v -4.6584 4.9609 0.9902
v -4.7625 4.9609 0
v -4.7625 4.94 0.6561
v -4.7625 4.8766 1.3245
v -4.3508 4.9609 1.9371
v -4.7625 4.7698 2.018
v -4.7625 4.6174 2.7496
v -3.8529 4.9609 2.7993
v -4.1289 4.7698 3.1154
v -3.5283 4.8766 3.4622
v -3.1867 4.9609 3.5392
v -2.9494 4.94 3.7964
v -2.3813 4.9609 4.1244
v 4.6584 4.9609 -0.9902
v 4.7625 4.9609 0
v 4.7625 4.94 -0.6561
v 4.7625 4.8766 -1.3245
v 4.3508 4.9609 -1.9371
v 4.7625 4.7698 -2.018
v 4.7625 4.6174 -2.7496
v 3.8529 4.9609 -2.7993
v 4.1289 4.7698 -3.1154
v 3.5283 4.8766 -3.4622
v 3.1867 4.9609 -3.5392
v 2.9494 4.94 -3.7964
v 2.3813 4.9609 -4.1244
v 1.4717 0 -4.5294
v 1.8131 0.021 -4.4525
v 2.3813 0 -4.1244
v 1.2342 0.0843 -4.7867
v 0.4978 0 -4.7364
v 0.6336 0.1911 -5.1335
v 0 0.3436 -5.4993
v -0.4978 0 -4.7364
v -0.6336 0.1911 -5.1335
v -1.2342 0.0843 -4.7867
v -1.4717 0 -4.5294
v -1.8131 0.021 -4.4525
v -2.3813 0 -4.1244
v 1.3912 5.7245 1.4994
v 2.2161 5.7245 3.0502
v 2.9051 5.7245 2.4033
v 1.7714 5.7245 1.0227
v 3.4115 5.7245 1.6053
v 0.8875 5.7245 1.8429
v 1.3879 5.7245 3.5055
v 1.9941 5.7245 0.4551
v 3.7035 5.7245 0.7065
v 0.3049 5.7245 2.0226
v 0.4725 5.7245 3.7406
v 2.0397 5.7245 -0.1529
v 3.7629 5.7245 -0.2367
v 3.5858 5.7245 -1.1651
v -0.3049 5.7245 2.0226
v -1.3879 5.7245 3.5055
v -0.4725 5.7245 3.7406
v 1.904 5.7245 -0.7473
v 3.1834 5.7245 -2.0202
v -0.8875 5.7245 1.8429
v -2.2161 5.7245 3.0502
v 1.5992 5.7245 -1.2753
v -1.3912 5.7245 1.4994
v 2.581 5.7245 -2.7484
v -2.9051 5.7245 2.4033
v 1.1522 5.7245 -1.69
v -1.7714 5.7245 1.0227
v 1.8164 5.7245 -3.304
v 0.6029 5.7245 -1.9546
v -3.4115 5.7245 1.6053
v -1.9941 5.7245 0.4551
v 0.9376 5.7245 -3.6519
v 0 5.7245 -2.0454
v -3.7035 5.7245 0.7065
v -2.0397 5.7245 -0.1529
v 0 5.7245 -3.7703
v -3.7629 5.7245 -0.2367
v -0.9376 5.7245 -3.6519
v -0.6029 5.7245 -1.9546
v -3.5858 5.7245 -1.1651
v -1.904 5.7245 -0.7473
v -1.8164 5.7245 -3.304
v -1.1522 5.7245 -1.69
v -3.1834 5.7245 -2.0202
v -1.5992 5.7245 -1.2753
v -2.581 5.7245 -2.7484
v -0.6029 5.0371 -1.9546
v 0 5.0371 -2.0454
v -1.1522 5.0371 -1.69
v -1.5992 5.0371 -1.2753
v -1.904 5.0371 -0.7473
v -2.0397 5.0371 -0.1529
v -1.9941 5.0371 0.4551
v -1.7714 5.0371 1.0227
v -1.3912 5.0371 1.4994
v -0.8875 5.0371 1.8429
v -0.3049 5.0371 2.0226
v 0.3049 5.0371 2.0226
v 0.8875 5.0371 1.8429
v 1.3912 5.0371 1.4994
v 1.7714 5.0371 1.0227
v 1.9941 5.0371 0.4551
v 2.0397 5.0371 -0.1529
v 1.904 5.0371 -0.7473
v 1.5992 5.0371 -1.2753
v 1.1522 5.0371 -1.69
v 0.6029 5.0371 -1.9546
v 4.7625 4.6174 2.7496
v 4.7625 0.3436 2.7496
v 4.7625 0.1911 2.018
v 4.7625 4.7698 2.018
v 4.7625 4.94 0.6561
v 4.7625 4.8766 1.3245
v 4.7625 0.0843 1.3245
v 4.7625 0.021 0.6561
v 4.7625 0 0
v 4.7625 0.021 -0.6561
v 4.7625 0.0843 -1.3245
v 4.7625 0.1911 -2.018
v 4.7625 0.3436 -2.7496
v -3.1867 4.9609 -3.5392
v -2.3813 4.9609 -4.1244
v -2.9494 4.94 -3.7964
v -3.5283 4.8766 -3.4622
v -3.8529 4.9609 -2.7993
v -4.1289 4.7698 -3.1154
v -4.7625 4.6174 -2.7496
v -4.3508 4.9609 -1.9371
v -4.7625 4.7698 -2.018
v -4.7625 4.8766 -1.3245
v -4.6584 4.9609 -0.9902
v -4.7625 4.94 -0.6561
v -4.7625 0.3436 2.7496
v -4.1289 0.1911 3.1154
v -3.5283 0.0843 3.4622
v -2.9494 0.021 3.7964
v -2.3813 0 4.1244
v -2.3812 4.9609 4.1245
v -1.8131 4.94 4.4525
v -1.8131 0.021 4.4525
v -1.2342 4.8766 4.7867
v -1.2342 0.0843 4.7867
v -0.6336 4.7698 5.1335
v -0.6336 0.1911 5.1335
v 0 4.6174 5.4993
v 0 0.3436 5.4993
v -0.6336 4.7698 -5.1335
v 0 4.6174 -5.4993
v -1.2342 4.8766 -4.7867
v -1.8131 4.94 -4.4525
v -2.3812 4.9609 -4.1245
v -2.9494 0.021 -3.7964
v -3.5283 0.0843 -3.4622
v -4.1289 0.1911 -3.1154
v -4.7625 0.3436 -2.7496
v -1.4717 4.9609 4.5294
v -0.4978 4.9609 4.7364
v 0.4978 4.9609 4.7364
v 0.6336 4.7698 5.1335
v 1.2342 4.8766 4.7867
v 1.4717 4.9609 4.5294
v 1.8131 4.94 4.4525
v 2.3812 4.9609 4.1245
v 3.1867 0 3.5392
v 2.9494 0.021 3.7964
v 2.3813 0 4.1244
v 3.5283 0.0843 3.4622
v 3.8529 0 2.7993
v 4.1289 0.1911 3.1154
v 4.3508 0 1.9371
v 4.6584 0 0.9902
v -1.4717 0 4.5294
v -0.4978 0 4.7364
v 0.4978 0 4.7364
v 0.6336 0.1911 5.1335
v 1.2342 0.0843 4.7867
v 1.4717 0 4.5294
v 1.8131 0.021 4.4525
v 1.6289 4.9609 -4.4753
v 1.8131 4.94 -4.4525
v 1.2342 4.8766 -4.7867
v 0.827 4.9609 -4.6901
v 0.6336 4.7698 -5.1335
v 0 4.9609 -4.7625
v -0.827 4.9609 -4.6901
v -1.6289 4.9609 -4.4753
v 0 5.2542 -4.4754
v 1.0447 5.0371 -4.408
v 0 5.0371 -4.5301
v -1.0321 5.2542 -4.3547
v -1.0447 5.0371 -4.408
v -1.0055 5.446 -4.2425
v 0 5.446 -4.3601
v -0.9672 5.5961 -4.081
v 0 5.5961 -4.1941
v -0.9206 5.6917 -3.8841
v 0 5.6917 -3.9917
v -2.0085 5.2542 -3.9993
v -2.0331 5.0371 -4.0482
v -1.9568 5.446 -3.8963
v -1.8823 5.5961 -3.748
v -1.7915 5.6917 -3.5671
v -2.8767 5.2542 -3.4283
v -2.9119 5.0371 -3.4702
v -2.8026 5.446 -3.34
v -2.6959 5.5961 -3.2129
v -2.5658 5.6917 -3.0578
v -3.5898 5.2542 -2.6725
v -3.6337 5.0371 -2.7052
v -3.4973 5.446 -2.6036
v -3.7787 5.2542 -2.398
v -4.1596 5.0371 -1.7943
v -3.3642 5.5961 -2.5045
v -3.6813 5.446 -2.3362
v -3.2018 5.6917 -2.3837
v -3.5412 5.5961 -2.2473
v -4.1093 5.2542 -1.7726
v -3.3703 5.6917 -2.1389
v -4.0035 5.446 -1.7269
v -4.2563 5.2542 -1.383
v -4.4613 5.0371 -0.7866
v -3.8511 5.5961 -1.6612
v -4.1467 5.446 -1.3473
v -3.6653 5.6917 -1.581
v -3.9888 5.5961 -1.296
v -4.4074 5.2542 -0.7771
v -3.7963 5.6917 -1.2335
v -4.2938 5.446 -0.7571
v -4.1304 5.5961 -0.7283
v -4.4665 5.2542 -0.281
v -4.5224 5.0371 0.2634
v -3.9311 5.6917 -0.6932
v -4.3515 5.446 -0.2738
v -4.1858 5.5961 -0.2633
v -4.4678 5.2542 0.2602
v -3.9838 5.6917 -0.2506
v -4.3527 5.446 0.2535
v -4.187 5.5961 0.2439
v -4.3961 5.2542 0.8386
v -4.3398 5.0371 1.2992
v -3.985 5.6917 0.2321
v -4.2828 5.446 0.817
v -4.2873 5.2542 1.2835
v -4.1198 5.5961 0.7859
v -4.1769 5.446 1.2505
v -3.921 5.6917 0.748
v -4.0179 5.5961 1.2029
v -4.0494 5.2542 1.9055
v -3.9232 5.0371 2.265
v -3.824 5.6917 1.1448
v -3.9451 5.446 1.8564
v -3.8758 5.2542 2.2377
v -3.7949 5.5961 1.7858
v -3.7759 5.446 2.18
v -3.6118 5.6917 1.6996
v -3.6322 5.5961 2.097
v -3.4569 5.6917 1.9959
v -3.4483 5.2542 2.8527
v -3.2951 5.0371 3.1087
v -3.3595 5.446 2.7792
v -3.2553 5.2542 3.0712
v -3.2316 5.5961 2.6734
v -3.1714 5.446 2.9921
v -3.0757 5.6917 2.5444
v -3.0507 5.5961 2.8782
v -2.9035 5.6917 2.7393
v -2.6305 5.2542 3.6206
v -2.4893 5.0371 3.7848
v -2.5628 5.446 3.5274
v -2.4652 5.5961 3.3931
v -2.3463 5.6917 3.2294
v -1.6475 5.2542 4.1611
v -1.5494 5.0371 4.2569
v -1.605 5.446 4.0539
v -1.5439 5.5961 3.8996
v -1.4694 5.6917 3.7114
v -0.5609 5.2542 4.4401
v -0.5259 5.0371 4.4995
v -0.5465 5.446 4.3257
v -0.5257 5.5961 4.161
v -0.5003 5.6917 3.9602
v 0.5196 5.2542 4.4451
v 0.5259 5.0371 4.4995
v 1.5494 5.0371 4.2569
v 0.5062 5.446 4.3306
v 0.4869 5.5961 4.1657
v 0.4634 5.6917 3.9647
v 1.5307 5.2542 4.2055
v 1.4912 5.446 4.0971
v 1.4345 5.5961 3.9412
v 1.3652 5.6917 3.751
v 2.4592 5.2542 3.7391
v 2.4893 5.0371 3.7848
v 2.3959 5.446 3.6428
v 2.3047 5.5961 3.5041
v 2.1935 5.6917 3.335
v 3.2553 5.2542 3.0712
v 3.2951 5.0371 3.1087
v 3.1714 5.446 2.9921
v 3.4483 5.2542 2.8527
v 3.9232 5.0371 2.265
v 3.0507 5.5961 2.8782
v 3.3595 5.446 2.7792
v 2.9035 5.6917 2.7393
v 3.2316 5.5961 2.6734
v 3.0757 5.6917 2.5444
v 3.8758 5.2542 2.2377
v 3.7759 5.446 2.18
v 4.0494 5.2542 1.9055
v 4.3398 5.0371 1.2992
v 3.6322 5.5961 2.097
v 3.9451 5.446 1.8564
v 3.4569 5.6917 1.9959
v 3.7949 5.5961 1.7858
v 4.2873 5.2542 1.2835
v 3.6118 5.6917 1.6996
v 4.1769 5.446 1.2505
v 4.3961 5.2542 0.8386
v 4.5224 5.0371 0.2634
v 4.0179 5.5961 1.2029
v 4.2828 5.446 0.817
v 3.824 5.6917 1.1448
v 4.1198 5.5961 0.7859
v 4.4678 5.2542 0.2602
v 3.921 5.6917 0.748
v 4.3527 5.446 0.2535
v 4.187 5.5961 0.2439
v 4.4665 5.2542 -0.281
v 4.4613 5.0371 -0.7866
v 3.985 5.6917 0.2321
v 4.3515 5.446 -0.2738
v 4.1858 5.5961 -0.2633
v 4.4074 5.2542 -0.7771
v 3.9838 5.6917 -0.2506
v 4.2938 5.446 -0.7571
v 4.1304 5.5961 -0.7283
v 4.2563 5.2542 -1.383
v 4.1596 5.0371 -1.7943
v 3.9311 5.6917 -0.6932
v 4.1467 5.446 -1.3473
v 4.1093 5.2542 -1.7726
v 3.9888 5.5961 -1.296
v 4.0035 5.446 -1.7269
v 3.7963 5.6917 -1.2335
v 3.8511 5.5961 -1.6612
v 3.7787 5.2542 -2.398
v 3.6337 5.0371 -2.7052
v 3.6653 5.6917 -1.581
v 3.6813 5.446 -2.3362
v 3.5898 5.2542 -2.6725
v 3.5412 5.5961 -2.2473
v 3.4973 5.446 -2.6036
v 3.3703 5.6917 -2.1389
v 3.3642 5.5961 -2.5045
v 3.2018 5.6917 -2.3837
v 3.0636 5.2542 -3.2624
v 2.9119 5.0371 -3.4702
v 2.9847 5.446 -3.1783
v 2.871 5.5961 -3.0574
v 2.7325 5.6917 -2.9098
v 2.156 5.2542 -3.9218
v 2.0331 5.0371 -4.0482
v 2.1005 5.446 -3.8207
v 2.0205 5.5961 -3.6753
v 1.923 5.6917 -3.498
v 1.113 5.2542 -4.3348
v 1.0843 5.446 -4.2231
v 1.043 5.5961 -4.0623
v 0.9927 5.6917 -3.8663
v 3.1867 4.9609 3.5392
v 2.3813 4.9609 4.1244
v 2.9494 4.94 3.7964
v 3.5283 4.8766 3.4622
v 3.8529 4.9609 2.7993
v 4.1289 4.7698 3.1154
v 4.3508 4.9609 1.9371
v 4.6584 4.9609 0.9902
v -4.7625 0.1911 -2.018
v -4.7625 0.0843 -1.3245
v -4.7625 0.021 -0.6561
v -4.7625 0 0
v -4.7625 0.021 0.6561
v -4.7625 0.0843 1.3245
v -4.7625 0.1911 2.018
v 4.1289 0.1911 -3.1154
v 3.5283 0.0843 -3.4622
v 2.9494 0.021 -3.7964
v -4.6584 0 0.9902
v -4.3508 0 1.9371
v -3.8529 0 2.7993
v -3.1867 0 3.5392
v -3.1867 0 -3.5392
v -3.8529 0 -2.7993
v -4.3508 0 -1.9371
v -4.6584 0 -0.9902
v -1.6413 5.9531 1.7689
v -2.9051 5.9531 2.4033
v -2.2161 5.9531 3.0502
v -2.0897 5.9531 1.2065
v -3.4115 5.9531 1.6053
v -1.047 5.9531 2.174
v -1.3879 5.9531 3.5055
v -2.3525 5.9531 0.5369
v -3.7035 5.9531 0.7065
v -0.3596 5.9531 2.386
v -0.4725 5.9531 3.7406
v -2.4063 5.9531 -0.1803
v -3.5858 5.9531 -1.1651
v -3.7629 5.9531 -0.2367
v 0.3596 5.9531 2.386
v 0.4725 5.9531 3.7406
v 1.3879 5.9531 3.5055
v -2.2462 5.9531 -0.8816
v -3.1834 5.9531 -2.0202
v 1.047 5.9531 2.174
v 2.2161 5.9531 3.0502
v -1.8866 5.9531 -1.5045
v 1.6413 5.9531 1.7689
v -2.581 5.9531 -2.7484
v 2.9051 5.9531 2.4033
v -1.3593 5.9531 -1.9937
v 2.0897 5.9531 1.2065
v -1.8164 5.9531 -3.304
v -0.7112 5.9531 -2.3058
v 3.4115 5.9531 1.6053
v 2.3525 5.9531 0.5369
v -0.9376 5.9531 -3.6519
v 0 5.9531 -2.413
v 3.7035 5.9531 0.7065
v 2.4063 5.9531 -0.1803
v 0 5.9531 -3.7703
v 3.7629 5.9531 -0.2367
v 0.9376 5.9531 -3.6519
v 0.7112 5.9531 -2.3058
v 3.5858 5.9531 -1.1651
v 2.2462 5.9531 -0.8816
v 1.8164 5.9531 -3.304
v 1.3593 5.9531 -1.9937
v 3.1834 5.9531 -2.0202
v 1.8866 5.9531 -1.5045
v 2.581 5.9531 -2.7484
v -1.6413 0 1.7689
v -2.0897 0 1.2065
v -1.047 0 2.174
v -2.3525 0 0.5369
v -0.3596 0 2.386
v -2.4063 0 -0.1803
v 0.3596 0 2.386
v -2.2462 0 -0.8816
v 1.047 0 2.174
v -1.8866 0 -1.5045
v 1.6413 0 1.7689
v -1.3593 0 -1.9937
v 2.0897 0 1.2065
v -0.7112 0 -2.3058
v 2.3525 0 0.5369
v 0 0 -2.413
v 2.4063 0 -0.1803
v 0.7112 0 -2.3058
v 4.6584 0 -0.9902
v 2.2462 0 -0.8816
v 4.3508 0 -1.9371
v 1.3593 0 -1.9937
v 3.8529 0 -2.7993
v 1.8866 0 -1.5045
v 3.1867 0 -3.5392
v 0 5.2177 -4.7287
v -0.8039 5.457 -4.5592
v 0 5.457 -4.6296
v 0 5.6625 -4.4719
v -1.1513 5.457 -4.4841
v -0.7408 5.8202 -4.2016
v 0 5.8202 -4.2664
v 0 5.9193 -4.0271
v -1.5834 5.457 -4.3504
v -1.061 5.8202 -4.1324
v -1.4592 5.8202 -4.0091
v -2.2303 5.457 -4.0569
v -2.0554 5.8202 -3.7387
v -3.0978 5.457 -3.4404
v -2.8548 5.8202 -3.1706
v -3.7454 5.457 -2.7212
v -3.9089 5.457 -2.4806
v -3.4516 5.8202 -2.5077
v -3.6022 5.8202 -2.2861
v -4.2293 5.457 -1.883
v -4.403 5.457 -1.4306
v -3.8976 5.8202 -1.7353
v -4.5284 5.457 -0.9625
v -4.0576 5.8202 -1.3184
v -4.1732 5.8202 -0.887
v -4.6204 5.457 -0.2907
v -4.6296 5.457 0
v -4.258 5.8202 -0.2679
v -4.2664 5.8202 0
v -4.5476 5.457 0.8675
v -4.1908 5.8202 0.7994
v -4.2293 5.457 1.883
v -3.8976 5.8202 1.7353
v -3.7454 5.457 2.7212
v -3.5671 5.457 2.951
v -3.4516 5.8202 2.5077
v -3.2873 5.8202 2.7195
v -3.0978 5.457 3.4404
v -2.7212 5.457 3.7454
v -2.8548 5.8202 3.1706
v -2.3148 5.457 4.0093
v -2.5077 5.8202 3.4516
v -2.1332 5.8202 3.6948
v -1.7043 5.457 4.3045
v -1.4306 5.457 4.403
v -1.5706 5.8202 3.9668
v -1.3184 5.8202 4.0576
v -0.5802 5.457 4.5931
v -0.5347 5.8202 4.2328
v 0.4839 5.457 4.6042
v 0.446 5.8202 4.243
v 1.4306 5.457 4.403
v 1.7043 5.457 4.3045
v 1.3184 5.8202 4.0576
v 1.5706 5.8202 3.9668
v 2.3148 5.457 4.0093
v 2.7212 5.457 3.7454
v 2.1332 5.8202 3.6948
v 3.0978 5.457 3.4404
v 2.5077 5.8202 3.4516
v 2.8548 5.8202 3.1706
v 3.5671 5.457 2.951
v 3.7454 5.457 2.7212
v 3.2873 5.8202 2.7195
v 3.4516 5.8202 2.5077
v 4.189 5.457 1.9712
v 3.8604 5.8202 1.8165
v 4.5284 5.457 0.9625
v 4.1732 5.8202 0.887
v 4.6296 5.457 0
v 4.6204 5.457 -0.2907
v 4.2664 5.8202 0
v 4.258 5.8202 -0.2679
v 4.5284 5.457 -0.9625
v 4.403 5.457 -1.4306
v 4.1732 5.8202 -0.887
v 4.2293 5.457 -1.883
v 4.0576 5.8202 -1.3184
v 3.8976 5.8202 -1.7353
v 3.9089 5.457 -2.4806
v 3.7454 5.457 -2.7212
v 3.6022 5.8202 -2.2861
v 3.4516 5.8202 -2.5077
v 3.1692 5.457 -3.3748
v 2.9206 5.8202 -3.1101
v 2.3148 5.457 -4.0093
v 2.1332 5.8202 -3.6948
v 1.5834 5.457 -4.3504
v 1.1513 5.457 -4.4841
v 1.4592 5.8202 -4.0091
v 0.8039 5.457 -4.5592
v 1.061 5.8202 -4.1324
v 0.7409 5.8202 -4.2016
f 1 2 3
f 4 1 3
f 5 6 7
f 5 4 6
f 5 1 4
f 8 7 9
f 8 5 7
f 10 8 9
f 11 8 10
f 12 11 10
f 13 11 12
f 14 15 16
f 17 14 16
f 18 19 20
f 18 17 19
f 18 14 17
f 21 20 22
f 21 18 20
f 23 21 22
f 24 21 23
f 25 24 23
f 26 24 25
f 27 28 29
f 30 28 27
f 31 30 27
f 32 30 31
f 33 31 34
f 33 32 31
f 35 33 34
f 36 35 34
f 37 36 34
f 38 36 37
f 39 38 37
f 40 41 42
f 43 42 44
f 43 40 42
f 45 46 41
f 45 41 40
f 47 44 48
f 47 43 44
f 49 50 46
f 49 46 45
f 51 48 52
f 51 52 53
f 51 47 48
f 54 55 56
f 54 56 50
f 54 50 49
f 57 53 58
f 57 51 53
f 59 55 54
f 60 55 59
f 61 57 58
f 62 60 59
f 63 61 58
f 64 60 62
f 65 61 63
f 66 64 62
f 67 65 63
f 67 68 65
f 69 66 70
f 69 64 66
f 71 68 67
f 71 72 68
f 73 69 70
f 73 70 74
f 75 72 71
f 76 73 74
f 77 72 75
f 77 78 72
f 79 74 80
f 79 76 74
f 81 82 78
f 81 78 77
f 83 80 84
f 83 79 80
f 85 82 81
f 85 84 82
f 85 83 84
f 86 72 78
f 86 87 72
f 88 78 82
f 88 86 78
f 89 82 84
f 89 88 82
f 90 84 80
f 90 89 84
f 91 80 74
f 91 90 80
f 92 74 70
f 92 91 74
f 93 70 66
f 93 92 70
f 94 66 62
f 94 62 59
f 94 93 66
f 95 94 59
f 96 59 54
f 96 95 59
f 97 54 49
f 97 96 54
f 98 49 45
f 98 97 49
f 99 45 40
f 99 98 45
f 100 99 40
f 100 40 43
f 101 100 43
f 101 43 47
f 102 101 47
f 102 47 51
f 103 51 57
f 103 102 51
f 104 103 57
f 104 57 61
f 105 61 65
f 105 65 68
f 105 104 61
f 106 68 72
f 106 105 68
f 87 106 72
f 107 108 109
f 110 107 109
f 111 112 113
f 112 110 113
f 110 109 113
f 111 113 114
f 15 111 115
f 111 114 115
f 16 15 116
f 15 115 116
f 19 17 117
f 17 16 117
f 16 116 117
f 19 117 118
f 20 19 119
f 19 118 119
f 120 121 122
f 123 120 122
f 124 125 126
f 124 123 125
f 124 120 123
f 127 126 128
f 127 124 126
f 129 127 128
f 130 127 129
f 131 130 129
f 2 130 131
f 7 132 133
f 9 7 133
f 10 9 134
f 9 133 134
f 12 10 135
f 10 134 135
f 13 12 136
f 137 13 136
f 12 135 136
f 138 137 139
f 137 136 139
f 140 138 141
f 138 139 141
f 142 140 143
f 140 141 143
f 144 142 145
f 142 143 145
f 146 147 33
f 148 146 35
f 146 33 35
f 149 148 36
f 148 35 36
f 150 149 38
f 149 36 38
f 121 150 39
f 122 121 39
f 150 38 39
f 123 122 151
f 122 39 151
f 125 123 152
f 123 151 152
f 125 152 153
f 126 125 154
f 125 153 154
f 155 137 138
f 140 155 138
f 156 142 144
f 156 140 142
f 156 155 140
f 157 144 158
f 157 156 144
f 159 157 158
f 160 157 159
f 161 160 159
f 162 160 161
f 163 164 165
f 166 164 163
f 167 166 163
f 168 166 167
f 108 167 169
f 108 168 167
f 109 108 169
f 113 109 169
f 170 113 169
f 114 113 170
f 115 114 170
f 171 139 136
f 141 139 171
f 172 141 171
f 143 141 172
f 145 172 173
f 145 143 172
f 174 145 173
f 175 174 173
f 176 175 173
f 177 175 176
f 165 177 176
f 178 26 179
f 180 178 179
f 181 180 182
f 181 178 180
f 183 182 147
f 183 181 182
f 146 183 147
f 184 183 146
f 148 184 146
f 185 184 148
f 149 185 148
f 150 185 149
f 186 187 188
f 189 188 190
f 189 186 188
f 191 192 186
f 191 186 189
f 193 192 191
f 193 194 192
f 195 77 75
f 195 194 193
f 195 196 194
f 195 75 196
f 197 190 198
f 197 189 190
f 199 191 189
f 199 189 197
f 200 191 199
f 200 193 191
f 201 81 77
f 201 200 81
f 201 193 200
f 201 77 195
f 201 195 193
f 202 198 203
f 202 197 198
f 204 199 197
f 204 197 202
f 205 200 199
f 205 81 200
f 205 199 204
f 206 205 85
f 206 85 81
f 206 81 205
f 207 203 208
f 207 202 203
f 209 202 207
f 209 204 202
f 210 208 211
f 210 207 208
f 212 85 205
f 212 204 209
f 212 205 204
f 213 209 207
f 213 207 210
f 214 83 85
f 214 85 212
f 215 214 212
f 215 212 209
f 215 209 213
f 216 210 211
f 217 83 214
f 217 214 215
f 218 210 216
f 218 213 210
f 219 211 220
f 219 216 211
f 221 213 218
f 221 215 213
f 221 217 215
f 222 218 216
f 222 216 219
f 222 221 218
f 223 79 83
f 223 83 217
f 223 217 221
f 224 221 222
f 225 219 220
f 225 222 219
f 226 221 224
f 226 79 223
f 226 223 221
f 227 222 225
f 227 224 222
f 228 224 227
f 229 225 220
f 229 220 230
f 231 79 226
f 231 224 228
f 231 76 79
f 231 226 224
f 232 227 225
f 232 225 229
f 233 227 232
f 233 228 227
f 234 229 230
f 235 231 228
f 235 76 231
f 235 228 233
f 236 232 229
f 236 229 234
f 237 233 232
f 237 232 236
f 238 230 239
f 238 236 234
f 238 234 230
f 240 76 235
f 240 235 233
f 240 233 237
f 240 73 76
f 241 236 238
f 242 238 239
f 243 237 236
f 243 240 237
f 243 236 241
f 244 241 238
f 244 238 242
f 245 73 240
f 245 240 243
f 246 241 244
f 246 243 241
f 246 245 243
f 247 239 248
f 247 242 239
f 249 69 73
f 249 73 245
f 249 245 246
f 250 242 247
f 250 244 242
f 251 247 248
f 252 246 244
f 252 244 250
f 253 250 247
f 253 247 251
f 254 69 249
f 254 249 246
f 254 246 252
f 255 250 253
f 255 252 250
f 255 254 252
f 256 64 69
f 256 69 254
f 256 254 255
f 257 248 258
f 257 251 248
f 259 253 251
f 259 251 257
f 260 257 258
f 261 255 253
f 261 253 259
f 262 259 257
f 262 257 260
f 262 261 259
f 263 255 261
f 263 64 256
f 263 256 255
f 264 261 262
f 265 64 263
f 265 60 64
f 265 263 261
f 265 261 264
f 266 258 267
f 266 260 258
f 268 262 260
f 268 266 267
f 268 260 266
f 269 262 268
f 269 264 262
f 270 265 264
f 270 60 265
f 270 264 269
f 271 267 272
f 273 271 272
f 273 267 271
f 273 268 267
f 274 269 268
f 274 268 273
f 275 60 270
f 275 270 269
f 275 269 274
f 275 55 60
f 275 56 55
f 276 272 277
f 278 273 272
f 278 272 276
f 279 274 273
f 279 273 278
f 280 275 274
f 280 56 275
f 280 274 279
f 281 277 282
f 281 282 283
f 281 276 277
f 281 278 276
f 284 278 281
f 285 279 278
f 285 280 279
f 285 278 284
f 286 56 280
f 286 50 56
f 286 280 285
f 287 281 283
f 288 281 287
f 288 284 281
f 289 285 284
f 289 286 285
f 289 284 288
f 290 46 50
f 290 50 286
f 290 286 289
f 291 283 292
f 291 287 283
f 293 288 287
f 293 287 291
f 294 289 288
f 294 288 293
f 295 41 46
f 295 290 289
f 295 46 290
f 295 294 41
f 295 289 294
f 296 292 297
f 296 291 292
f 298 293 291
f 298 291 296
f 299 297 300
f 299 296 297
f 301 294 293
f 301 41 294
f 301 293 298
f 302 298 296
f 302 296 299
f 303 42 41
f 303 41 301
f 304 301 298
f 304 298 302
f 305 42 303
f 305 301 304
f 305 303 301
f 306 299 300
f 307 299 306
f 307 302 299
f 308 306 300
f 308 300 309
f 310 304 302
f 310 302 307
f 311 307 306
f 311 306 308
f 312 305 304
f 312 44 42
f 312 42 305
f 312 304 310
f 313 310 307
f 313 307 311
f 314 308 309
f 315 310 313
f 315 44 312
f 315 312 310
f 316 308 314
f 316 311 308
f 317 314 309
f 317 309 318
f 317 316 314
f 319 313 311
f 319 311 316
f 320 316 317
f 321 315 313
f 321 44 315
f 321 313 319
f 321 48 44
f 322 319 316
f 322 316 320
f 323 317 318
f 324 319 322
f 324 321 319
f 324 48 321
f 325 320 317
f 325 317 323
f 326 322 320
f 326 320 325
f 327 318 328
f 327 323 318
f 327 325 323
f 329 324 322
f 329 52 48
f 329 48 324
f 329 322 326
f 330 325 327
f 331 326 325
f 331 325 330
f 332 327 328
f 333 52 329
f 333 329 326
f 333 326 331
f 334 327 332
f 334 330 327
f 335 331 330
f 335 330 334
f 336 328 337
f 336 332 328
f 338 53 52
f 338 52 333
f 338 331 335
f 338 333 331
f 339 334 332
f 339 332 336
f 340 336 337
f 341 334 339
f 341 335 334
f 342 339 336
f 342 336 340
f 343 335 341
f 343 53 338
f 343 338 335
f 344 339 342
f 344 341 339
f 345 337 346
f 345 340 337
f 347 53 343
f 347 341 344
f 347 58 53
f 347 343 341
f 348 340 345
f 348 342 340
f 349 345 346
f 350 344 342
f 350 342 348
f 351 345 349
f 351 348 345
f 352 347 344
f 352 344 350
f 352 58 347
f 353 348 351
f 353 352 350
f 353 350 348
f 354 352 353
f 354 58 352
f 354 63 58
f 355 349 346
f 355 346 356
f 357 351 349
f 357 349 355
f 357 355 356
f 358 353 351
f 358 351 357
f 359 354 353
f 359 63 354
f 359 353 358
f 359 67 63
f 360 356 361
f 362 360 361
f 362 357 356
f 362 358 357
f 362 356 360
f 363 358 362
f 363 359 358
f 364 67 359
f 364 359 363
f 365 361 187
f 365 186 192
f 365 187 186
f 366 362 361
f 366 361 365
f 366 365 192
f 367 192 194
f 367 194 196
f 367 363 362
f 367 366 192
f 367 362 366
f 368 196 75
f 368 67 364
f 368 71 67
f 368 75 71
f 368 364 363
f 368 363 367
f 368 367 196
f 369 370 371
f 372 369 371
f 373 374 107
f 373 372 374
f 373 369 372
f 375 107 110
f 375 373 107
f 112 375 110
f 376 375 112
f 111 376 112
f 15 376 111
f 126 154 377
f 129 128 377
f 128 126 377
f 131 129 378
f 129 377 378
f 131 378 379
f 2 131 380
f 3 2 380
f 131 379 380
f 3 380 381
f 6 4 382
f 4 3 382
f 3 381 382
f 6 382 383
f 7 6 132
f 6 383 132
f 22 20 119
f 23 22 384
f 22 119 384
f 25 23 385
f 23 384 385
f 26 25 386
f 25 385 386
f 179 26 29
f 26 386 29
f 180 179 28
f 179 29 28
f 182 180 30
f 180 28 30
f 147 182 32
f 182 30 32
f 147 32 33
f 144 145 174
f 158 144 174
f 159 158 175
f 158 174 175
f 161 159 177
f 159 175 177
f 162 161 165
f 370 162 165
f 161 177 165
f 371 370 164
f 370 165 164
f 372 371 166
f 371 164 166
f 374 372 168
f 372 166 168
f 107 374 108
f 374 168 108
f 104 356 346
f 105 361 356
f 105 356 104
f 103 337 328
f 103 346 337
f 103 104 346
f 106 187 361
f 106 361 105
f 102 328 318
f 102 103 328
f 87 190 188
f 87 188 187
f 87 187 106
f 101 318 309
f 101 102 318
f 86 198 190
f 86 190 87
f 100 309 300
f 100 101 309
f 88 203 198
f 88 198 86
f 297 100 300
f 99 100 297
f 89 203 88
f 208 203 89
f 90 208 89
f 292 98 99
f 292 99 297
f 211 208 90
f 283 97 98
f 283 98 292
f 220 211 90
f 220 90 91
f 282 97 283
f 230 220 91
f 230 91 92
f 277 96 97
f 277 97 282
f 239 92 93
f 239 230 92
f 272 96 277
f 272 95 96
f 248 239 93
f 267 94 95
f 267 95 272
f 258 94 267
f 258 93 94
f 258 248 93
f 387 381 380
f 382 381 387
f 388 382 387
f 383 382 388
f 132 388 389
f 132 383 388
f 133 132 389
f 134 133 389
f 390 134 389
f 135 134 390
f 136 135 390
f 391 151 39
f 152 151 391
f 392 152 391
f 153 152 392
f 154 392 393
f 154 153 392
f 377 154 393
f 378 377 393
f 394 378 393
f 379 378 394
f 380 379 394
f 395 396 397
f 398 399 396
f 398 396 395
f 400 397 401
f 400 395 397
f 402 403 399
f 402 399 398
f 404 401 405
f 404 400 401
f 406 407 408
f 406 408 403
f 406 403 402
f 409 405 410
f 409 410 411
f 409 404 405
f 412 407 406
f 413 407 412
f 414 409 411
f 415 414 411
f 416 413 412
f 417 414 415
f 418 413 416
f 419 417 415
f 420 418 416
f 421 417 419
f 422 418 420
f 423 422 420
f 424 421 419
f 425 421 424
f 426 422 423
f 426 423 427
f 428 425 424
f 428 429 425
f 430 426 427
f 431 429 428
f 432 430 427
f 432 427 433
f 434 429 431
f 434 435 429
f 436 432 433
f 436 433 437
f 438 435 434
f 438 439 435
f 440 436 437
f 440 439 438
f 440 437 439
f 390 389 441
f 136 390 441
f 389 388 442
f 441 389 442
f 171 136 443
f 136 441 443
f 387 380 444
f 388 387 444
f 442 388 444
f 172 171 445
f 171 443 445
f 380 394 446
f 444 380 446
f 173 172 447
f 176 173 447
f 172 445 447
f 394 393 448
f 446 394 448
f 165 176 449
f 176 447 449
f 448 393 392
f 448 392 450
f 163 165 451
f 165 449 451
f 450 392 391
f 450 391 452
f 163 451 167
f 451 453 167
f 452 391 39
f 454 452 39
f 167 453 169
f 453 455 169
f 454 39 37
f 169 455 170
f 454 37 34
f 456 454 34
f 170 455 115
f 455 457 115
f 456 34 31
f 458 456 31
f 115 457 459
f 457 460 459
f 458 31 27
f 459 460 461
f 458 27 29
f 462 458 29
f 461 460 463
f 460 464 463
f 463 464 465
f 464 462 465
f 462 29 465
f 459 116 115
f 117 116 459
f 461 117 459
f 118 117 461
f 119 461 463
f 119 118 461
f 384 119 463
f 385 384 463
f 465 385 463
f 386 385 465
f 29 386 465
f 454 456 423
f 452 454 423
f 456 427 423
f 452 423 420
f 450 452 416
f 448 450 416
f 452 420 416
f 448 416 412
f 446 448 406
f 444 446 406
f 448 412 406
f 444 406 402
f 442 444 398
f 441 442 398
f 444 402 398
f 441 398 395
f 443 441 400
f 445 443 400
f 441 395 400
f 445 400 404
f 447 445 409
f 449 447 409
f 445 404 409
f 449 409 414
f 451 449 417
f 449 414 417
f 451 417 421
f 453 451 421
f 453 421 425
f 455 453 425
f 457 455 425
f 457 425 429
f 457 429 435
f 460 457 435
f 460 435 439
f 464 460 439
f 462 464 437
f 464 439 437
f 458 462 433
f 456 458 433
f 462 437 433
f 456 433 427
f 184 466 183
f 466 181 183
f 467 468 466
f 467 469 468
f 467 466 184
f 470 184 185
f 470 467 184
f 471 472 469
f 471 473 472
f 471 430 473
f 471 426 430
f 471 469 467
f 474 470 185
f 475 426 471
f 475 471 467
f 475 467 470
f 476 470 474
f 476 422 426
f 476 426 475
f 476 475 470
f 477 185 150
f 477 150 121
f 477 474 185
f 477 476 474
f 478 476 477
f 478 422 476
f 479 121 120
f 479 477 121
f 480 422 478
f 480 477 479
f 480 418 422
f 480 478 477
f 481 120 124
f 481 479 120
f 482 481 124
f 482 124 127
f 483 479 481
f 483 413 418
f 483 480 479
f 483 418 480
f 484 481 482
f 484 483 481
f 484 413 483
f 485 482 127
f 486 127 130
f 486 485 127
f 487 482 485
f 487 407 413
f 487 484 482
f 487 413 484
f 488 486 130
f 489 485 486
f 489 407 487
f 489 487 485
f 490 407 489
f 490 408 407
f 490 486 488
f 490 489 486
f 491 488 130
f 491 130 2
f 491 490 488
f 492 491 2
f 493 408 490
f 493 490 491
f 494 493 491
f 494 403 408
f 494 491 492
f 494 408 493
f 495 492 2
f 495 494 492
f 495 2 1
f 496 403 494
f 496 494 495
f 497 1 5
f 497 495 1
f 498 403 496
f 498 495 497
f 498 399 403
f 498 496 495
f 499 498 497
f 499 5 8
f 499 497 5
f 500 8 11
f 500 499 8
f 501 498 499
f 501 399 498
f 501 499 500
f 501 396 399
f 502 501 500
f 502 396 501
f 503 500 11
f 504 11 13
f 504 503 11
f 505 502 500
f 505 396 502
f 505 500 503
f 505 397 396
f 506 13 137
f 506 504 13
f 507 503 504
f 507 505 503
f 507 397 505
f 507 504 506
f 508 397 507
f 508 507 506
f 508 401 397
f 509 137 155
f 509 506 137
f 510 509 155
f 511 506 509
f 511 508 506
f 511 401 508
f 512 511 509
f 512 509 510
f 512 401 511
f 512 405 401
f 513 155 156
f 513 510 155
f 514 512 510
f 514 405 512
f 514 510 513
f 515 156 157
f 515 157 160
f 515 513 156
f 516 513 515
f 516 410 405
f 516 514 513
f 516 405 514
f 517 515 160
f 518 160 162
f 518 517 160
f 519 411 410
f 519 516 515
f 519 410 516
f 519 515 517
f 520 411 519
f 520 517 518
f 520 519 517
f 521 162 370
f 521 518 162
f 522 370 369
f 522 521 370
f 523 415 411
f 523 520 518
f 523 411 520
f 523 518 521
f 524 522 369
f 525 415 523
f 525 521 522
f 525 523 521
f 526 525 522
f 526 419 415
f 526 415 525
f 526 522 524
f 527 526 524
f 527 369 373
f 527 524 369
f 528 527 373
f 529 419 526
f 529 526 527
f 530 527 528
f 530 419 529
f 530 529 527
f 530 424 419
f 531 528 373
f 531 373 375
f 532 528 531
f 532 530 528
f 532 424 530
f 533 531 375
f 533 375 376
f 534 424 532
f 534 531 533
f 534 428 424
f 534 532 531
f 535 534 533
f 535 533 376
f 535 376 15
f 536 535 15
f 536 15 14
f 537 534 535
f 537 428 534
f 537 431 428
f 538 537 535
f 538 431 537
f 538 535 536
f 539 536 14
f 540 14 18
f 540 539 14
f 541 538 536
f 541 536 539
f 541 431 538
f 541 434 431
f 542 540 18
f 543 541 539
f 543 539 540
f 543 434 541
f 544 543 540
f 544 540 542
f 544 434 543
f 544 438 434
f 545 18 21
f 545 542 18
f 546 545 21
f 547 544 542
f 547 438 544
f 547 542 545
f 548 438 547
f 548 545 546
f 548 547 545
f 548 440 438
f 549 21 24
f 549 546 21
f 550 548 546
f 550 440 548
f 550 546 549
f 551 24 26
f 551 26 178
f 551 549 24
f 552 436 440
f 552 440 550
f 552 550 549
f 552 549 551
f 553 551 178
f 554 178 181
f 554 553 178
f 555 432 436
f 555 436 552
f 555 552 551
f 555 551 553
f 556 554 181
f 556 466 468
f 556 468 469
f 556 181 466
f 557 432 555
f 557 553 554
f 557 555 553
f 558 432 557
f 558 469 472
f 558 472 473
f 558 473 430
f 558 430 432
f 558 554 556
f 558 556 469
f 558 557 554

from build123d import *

# Parameters (mm, degrees)
EXTRUDE1_DEPTH = 5.953125
SKETCH2_W      = 2.413
SKETCH2_H      = 5.953125


with BuildPart() as part:
    # Sketch1 → Extrude1 (new body)
    with BuildSketch(Plane(origin=(0, 0, 0), x_dir=(1, 0, 0), z_dir=(0, 1, 0))):
        Polygon((0, 5.499261314), (-4.7625, 2.749630657), (-4.7625, -2.749630657), (0, -5.499261314), (4.7625, -2.749630657), (4.7625, 2.749630657), align=None)
    extrude(amount=EXTRUDE1_DEPTH)


with BuildPart() as body_2:
    # Sketch2 → Revolve1 (revolve)
    with BuildSketch(Plane(origin=(0, 0, 0), x_dir=(0, 0, -1), z_dir=(1, 0, 0))):
        with Locations((1.2065, 2.9765625)):
            Rectangle(SKETCH2_W, SKETCH2_H)
    revolve(axis=Axis((0, -2.413, 0), (0, 1, 0)))


with BuildPart() as part_1:
    add(part.part)

    # Combine1: cut body 2
    add(body_2.part, mode=Mode.SUBTRACT)

    # Sketch5 → Cut-Revolve3 (revolve, cut)
    with BuildSketch(Plane(origin=(0, 0, 0), x_dir=(0, 0, -1), z_dir=(1, 0, 0))):
        with BuildLine():
            Line((0, 0), (4.7625, 0))
            Line((4.7625, 0), (5.499261314, 0.343557443))
            Line((5.499261314, 0.343557443), (5.499261314, 4.617380057))
            Line((5.499261314, 4.617380057), (4.7625, 4.9609375))
            ThreePointArc((4.7625, 4.9609375), (4.471895009, 5.662520009), (3.7703125, 5.953125))
            Line((3.7703125, 5.953125), (3.7703125, 7.223125))
            Line((3.7703125, 7.223125), (6.769261314, 7.223125))
            Line((6.769261314, 7.223125), (6.769261314, -1.27))
            Line((6.769261314, -1.27), (0, -1.27))
            Line((0, -1.27), (0, 0))
        make_face()
    revolve(axis=Axis((0, 0, 0), (0, 1, 0)), mode=Mode.SUBTRACT)


with BuildPart() as body_2_2:
    # Sketch7 → Revolve2 (revolve)
    with BuildSketch(Plane(origin=(0, 0, 0), x_dir=(0, 0, -1), z_dir=(1, 0, 0))):
        with BuildLine():
            Line((2.045424837, 5.0371375), (4.530088408, 5.0371375))
            ThreePointArc((4.530088408, 5.0371375), (4.282601726, 5.527175629), (3.7703125, 5.724525))
            Line((3.7703125, 5.724525), (2.045424837, 5.724525))
            Line((2.045424837, 5.724525), (2.045424837, 5.0371375))
        make_face()
    revolve(axis=Axis((0, 5.0371375, 0), (0, 1, 0)))


solid = Compound([part_1.part, body_2_2.part])
